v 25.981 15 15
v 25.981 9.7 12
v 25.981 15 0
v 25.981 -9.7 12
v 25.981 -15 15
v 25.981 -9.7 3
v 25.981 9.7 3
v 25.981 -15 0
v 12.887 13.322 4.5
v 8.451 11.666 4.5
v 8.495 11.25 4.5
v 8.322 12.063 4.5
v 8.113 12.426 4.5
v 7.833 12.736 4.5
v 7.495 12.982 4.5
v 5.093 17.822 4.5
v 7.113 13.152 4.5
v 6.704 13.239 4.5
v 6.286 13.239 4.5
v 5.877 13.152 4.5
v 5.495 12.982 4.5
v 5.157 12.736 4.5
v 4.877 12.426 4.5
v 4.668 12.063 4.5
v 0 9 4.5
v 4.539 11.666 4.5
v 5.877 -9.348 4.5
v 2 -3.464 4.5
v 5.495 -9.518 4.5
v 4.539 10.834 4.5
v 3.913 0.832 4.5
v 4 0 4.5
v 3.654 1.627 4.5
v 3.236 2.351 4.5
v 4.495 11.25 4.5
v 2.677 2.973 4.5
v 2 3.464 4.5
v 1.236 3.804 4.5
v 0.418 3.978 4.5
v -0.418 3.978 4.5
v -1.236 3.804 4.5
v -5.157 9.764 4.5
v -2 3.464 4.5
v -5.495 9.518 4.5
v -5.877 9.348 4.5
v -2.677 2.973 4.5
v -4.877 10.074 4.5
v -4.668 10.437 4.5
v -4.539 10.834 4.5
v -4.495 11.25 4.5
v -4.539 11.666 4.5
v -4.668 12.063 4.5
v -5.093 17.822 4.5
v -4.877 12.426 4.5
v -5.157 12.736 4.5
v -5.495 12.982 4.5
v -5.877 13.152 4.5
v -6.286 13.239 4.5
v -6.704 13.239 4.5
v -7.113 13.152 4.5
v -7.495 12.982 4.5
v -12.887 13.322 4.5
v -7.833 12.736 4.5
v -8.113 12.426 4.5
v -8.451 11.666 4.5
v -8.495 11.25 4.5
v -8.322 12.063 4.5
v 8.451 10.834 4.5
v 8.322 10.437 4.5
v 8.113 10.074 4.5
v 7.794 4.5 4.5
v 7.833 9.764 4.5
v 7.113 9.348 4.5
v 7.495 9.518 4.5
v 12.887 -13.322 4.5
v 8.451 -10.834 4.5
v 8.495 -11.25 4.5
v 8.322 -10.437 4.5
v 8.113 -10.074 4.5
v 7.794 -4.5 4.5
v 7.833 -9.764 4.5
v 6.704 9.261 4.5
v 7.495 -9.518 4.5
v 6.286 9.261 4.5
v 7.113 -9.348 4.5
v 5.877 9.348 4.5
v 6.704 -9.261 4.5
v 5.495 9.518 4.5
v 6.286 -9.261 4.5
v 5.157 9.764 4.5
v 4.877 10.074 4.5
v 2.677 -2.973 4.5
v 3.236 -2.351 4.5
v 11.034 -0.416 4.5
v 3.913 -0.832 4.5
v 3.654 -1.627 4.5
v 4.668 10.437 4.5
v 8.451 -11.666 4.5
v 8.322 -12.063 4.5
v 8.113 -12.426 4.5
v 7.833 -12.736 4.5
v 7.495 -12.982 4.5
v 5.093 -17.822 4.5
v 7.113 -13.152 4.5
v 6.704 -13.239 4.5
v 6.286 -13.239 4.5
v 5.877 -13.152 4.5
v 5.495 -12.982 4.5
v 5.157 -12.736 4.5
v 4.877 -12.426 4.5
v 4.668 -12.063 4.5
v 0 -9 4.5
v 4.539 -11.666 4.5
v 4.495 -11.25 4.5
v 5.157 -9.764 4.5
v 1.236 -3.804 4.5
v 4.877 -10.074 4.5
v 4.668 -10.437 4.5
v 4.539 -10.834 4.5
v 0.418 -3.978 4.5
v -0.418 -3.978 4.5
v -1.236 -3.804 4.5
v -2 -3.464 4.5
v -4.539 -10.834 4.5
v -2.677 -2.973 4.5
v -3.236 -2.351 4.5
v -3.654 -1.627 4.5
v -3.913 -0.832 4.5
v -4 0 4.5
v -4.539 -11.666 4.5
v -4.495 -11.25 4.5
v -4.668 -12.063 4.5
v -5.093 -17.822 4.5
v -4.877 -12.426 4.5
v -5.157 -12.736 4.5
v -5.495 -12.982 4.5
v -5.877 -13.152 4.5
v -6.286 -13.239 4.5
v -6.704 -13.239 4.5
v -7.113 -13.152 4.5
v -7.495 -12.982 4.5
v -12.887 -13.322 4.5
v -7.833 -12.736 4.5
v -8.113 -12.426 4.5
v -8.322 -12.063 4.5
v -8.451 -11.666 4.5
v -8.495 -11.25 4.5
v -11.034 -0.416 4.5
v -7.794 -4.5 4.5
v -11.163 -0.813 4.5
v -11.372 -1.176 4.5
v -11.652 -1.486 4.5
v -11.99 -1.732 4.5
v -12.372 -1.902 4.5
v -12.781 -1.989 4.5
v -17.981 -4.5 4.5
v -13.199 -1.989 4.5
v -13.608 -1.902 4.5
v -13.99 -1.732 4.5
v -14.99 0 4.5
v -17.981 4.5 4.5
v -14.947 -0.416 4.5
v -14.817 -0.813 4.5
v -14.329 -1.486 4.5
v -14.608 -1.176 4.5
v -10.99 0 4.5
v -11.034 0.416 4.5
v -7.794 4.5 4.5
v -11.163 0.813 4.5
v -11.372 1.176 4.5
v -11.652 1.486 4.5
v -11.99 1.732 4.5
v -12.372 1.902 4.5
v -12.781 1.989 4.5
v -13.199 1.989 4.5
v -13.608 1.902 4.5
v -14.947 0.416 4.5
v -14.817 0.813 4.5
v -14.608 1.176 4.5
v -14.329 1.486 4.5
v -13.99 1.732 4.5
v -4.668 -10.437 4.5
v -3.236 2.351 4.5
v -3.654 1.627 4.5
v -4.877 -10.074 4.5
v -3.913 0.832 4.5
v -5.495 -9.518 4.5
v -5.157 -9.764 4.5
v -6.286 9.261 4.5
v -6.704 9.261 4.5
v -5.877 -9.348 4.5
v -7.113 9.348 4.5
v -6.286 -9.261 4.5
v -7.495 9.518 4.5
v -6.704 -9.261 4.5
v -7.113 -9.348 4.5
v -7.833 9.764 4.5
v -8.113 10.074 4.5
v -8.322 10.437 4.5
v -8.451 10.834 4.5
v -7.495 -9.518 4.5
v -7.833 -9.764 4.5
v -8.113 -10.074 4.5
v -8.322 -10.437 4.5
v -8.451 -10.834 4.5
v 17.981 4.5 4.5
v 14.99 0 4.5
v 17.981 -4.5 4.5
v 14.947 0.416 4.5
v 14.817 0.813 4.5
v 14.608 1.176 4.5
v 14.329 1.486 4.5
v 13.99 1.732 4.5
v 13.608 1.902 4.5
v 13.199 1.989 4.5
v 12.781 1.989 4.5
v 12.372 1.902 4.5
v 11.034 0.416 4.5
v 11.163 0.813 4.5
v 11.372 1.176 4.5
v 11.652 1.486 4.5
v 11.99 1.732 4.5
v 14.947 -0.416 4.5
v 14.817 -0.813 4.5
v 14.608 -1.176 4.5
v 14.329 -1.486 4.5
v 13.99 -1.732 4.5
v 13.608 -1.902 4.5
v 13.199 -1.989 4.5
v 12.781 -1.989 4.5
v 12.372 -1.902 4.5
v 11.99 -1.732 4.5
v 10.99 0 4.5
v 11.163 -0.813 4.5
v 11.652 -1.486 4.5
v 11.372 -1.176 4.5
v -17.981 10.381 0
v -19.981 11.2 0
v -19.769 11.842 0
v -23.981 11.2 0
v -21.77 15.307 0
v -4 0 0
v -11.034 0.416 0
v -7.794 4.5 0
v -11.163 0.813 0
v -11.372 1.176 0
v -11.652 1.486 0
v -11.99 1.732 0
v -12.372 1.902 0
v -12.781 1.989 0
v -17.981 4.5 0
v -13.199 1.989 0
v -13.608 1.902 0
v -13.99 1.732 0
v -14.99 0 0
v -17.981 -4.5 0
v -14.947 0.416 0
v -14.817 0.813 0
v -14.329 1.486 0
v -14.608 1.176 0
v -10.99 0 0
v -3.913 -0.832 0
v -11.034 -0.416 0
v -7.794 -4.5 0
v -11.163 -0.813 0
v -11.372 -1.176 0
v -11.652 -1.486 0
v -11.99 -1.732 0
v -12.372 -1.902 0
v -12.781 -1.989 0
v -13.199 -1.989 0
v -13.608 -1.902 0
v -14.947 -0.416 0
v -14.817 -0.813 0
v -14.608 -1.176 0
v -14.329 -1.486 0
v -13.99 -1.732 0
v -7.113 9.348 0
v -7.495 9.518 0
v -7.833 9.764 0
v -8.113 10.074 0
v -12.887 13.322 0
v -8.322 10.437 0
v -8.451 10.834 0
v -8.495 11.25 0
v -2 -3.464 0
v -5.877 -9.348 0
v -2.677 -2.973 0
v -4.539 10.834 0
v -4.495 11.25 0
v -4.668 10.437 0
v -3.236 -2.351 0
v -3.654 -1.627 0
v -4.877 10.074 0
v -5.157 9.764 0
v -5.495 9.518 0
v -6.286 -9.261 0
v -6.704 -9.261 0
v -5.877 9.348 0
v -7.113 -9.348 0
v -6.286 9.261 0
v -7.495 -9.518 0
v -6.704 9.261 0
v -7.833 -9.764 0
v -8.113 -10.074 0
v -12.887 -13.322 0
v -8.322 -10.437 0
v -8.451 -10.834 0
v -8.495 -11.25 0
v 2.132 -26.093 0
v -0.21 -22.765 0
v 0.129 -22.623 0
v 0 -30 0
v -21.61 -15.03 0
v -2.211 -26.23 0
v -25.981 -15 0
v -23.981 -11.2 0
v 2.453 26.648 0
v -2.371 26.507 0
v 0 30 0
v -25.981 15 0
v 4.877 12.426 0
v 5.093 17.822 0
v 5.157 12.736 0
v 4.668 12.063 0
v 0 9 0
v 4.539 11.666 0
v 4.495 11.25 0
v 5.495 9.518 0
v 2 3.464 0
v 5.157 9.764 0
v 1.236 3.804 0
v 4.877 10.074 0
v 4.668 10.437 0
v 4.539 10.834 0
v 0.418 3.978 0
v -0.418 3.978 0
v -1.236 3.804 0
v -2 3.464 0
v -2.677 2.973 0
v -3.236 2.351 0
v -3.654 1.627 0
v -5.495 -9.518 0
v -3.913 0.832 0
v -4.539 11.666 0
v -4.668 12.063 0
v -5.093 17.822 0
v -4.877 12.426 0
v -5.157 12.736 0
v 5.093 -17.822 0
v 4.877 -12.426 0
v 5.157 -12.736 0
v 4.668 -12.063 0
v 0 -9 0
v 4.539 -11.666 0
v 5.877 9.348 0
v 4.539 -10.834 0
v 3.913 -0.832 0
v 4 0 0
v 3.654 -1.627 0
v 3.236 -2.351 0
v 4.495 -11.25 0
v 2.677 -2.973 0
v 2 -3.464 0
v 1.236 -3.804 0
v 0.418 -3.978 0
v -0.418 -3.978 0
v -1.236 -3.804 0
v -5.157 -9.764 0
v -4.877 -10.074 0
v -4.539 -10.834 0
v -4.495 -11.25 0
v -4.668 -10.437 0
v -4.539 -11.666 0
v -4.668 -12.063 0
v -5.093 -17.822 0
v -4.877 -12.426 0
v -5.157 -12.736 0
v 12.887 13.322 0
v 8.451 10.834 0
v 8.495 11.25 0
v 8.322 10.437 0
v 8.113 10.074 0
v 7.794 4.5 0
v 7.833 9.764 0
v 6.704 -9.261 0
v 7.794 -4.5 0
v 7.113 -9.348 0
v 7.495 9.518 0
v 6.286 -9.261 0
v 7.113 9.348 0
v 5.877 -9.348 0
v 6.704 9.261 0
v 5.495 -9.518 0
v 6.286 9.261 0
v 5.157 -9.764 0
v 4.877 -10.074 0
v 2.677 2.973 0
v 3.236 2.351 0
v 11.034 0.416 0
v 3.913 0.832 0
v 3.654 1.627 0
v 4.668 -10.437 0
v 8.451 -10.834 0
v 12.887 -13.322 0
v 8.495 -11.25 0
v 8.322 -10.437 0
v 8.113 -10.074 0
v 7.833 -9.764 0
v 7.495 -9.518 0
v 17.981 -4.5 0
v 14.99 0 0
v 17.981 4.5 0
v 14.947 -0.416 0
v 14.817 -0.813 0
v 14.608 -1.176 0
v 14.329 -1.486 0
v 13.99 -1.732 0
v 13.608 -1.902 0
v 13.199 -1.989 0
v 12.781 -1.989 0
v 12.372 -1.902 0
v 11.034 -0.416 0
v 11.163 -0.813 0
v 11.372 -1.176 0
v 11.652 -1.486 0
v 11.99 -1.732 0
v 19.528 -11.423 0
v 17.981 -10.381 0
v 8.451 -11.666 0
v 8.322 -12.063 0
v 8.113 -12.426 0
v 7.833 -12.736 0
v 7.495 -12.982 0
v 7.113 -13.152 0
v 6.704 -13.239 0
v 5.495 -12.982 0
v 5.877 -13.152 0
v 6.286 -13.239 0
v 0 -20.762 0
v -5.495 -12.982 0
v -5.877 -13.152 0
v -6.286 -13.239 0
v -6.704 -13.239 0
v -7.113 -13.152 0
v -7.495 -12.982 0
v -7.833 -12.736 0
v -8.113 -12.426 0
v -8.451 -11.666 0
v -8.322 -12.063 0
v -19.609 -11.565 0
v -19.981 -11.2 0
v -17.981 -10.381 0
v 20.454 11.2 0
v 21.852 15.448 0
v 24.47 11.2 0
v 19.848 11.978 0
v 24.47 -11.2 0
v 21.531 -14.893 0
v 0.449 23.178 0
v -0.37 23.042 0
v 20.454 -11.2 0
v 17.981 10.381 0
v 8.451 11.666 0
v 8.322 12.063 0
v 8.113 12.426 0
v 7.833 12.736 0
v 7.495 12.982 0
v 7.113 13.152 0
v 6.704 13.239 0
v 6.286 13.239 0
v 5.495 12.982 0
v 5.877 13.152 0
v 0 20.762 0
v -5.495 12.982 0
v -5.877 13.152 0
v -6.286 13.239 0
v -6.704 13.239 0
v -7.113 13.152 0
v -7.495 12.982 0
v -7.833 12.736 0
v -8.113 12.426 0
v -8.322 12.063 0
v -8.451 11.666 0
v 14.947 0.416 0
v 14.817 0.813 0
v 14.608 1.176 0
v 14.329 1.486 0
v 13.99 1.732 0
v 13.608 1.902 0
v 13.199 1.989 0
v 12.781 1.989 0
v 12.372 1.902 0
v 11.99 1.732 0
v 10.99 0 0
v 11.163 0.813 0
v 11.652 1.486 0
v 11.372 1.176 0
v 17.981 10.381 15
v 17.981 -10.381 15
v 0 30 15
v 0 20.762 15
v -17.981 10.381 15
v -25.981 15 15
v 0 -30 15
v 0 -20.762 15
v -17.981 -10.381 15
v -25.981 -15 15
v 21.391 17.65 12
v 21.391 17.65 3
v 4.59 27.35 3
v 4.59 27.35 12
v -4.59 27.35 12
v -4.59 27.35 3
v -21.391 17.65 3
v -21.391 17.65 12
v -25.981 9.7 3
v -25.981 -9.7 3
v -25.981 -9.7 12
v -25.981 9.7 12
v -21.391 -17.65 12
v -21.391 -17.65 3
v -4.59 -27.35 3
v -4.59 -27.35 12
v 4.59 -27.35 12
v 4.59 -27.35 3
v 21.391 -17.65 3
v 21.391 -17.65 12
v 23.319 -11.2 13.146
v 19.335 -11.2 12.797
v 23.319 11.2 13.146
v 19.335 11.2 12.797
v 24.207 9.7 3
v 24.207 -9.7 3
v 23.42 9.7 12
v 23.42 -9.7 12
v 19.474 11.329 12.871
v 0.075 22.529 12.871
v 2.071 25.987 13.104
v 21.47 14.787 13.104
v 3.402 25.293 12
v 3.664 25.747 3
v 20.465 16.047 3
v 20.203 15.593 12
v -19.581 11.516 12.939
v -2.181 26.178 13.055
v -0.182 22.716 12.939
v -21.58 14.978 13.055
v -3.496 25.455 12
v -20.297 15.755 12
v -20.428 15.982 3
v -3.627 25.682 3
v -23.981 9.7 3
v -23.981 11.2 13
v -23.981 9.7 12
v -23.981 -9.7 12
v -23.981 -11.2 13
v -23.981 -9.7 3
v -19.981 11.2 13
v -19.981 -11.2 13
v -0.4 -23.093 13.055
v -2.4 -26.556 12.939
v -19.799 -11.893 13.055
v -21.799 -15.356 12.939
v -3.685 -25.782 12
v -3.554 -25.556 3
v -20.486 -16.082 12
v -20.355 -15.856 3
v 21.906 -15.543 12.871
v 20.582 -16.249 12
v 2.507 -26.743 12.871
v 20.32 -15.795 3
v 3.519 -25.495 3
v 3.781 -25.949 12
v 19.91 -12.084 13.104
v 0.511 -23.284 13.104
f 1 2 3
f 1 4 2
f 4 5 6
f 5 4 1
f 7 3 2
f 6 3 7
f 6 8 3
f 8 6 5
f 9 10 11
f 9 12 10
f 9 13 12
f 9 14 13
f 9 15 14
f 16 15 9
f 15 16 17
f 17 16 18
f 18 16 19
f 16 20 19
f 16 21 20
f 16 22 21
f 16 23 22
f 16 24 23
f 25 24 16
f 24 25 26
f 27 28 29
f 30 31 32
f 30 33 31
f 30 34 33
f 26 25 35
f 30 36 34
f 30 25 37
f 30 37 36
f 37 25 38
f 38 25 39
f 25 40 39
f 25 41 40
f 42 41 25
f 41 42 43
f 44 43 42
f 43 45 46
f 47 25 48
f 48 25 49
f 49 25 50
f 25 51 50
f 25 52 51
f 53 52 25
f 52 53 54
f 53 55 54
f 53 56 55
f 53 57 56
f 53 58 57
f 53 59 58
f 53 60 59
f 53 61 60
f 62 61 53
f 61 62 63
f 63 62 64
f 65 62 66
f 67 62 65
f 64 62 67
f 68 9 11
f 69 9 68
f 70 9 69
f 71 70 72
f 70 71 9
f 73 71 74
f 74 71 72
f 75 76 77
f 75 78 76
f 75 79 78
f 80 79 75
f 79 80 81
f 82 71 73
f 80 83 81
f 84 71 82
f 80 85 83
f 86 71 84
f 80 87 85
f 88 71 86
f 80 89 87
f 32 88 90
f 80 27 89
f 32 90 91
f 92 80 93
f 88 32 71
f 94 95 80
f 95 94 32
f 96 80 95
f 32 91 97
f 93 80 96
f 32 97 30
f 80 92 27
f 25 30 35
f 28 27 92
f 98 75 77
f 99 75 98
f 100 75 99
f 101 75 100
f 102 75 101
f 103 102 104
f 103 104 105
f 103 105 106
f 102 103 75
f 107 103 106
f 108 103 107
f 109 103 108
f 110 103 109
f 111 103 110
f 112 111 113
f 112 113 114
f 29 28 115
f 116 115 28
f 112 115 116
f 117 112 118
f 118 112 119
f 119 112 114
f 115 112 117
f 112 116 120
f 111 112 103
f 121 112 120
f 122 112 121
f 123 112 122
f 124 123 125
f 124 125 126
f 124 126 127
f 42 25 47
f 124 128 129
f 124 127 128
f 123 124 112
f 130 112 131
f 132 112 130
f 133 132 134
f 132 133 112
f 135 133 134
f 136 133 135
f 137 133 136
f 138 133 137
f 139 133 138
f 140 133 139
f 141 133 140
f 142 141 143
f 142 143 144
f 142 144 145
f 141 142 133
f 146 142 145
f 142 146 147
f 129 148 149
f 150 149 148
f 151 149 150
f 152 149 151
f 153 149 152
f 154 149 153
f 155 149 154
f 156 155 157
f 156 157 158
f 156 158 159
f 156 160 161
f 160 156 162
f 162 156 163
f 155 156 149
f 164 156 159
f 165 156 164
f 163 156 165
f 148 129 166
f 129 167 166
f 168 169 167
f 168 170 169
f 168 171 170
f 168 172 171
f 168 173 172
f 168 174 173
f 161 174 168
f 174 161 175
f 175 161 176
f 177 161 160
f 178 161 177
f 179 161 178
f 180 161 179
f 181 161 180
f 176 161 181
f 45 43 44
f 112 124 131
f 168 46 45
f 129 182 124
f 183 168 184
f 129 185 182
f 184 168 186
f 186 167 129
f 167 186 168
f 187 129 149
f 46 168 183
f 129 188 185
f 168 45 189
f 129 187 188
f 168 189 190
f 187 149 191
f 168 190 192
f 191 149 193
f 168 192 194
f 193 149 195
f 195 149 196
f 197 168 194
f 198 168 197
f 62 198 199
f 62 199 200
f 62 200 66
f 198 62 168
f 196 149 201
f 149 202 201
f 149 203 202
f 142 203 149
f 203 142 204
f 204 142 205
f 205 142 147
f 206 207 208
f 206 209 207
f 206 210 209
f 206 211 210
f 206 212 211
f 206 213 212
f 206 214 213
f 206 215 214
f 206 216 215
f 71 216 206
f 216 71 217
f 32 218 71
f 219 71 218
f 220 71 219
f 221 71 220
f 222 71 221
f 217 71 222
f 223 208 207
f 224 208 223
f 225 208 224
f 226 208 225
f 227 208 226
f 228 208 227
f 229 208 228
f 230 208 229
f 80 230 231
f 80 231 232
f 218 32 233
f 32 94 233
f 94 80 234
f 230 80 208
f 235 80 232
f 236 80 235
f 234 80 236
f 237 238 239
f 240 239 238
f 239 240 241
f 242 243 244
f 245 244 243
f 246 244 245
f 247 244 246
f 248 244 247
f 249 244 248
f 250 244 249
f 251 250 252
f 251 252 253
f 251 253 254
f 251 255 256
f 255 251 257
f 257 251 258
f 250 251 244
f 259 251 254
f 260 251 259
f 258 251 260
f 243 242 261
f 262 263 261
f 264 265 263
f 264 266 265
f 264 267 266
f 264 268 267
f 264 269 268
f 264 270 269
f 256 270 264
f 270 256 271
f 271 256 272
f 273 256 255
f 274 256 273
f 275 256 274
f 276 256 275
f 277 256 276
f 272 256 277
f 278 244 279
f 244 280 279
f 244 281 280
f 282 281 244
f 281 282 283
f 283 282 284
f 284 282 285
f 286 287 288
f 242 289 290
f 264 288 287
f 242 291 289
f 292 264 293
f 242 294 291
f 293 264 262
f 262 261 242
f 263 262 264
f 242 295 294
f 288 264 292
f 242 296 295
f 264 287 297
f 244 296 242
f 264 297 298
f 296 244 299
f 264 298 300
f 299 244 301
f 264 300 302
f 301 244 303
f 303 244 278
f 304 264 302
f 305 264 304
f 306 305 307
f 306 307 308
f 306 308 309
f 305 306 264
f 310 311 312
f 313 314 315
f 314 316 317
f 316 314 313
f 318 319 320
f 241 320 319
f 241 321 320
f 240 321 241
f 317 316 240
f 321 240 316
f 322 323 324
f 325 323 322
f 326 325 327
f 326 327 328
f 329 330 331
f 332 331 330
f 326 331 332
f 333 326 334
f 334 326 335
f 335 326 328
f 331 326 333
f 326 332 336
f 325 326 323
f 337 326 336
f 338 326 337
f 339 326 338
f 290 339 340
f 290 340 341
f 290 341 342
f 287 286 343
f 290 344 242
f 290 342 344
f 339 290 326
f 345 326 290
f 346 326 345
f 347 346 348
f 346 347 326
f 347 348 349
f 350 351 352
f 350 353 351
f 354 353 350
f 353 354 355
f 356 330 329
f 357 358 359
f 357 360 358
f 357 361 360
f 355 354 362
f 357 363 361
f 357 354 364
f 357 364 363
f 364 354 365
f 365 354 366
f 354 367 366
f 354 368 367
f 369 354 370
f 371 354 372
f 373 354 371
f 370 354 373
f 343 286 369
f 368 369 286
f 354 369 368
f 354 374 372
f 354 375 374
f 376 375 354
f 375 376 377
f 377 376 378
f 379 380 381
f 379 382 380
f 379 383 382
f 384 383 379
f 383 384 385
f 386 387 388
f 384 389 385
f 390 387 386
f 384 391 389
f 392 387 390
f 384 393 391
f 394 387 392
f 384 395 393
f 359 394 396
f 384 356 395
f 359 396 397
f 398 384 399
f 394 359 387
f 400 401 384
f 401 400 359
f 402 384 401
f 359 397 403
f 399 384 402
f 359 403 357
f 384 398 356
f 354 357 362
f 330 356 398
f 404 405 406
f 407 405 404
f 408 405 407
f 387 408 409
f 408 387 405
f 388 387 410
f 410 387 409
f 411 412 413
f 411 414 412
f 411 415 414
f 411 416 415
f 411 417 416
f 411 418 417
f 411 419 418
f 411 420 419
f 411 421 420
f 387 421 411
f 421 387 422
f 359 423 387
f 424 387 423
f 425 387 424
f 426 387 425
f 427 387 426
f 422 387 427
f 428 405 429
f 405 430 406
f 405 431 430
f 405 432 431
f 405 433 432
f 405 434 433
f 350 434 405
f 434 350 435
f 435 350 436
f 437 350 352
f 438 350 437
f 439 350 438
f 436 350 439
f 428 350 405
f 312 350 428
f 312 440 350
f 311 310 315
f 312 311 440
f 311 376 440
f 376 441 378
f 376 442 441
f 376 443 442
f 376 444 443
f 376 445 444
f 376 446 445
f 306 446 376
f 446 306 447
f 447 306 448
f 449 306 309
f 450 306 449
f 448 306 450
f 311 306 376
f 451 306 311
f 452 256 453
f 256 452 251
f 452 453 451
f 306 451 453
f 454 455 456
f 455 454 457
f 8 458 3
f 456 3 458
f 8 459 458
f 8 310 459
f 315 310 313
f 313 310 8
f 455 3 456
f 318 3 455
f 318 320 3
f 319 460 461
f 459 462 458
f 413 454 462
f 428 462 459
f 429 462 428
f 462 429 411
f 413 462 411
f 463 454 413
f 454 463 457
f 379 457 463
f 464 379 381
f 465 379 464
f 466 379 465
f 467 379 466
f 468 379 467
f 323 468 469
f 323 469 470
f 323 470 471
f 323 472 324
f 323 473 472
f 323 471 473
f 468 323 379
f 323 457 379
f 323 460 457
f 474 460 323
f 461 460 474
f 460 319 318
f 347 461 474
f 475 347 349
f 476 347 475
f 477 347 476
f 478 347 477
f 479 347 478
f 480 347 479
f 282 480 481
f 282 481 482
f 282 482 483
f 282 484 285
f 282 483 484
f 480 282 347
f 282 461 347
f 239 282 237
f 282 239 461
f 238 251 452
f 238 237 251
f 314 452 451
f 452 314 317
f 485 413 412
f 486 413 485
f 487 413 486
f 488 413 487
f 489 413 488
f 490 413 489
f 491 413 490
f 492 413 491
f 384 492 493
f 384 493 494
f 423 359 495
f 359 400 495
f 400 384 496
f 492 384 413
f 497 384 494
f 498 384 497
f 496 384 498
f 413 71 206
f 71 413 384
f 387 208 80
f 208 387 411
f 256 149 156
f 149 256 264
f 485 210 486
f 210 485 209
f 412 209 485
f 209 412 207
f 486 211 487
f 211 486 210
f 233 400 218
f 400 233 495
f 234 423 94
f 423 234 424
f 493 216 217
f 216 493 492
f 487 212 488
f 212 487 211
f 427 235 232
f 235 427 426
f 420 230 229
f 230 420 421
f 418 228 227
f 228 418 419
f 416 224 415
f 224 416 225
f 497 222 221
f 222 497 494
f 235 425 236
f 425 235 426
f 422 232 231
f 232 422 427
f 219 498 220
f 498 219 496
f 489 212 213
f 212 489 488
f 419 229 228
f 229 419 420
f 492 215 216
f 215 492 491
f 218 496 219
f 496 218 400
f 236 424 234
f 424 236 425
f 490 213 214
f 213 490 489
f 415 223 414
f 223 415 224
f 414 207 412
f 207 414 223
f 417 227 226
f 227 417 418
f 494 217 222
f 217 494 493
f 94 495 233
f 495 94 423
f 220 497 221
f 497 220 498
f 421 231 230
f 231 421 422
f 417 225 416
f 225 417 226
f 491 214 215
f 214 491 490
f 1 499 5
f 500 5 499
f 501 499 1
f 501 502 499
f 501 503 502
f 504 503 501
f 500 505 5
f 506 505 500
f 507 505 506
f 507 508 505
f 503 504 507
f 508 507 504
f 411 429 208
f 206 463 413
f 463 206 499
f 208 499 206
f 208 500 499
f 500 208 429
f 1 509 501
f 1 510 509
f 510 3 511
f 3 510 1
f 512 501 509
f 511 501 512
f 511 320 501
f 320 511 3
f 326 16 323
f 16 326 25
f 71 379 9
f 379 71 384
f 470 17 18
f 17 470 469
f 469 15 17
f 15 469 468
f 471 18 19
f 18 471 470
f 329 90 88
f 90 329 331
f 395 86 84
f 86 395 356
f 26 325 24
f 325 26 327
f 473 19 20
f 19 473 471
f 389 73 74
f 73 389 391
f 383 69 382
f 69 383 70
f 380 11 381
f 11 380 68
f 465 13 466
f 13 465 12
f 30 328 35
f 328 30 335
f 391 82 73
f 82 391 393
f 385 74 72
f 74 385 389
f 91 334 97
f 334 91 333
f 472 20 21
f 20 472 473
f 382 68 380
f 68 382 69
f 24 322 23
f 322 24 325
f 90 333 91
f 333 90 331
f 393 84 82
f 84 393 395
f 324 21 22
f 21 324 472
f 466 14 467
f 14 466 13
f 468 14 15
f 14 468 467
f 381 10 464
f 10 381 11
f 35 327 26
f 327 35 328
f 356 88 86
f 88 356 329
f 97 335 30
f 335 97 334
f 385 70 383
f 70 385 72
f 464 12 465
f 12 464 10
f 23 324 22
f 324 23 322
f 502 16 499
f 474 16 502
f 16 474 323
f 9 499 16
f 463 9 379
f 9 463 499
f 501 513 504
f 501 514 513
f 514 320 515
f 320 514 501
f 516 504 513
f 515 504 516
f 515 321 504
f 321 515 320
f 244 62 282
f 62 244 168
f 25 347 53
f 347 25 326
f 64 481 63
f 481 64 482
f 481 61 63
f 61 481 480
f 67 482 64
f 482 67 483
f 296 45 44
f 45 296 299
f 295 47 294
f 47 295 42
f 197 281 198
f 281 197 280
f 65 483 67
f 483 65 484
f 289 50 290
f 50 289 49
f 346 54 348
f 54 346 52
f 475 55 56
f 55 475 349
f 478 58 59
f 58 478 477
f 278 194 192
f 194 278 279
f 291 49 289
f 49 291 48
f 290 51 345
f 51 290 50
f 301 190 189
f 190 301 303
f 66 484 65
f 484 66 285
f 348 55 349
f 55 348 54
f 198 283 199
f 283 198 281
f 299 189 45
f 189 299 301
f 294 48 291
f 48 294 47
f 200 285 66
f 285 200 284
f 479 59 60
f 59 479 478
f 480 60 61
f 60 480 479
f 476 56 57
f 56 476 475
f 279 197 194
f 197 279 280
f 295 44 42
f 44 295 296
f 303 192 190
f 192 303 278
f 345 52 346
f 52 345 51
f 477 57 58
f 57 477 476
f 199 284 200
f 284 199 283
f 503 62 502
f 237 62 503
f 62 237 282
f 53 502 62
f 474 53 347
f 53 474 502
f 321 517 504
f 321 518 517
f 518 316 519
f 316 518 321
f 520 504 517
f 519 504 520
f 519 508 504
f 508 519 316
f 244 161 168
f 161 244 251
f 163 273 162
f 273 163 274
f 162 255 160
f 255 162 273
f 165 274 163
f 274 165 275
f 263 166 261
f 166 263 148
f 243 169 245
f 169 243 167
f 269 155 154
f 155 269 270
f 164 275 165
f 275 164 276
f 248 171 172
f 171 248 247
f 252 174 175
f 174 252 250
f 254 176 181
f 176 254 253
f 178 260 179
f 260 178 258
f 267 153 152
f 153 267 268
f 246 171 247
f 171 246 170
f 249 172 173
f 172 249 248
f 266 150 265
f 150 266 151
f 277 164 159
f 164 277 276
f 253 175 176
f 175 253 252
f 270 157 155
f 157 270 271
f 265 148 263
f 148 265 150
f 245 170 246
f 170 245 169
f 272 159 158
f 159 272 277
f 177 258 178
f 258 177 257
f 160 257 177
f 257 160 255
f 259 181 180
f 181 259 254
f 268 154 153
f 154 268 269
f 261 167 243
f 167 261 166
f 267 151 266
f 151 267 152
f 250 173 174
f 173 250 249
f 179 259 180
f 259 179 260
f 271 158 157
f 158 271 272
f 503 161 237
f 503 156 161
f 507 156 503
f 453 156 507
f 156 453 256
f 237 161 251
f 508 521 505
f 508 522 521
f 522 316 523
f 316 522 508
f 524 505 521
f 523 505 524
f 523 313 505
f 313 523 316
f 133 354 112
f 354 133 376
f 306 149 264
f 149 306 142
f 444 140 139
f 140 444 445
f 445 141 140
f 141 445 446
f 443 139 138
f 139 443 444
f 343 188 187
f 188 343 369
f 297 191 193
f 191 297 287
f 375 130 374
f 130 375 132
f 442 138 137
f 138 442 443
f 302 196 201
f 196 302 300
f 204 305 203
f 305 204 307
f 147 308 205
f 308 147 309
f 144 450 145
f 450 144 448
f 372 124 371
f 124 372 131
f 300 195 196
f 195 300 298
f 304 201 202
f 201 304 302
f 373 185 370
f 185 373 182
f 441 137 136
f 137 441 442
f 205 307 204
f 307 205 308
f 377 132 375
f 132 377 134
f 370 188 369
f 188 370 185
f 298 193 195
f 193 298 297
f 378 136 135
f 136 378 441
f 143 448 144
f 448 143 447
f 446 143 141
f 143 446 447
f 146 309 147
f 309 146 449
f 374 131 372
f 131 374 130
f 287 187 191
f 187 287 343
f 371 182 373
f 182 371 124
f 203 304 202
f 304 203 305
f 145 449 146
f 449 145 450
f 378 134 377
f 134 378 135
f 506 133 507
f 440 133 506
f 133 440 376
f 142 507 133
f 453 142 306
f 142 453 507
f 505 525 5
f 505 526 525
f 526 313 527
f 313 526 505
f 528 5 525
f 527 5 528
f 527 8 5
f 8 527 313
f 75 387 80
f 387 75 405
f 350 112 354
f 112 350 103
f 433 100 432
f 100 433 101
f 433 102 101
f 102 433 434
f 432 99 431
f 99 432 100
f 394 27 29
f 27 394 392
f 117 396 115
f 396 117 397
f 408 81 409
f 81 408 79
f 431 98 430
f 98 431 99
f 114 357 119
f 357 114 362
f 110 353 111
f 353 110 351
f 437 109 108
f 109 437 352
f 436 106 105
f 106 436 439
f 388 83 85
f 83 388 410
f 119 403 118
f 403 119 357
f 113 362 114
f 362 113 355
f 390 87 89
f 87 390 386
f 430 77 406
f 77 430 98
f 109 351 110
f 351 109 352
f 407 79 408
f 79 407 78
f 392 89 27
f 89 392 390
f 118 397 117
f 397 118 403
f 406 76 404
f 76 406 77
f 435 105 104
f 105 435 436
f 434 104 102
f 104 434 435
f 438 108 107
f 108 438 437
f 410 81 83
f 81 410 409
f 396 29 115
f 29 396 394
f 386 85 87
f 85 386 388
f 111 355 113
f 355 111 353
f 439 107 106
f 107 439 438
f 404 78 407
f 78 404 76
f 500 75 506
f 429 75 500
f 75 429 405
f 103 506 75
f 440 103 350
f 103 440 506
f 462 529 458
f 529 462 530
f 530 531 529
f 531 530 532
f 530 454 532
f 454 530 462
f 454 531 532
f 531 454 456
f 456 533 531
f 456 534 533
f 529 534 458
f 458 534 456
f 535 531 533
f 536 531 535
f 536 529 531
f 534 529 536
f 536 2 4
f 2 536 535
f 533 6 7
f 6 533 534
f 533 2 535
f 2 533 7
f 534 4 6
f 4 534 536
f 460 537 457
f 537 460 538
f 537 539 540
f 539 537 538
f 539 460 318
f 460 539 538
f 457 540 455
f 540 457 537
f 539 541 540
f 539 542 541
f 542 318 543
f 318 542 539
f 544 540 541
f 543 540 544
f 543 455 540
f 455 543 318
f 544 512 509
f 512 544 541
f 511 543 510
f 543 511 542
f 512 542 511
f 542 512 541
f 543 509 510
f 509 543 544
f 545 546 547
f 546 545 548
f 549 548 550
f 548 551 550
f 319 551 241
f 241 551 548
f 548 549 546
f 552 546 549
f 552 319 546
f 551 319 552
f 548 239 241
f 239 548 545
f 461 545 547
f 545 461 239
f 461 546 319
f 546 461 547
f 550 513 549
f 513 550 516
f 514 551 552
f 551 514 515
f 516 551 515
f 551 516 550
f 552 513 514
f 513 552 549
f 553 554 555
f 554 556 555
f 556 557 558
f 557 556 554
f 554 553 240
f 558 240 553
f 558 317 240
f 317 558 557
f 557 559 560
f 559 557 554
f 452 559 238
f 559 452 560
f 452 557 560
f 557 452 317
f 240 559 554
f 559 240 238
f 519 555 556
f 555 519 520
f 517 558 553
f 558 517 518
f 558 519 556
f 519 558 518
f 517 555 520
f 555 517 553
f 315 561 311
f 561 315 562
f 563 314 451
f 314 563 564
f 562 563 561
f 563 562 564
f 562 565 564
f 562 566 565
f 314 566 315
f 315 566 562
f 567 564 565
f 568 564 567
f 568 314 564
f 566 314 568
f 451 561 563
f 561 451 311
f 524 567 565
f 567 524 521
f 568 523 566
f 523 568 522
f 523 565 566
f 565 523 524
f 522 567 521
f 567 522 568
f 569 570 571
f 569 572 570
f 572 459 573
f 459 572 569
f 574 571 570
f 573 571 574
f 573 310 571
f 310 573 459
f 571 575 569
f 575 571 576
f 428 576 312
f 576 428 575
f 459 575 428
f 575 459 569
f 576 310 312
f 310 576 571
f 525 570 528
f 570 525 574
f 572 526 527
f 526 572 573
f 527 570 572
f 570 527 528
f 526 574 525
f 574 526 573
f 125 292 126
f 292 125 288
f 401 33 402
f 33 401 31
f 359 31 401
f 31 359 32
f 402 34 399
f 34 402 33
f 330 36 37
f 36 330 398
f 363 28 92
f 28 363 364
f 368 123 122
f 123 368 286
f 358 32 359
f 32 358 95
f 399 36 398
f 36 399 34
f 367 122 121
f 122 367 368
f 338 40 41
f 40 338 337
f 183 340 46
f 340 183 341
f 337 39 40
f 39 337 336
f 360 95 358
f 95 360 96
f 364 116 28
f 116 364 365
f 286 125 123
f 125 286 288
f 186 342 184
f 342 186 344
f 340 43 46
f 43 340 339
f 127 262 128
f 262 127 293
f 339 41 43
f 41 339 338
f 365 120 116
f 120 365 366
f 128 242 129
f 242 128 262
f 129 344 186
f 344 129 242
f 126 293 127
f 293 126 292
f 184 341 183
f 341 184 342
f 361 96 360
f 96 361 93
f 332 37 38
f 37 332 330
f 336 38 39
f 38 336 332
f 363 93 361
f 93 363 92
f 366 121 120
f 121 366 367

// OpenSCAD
multiHolder(sides = 6, diameter = 60, height =15, mirrorThickness = 4, mirrorAngleSpreadDeg = 10, mirrorMarginFactor=0.3, wallThickness=2);


module multiHolder(sides = 5, diameter = 80, height = 20, mirrorAngleSpreadDeg = 15, mirrorThickness = 3, centerHoleDiam = 8, defaultSpokeHoleDiam = 4, mirrorOpeningsUp = false, mirrorMarginFactor=1, wallThickness = 3) {

    radius = diameter/2;

    sideLen = 2 * radius * sin ( 180 / sides );

    angleStep = 360 / sides;

    // The apothem, or distance from center to middle of a side
    inradius = radius * cos(180 / sides);

    spokeW = sideLen * 0.3;
    spokeH = height * 0.3;
    spokeHoleDiam = min(defaultSpokeHoleDiam, spokeW - wallThickness*2);
    spokeHoleDist = inradius * 0.5;

    mirrorSideMargin = mirrorMarginFactor * mirrorThickness * 1.5 + wallThickness;
    mirrorW = sideLen - mirrorSideMargin*2;
    mirrorH = height + wallThickness*2;
    mirrorAngleStep = mirrorAngleSpreadDeg / sides;
    mirrorZOffset = wallThickness*2 * (mirrorOpeningsUp ? 1 : -1); 
    
    echo("Mirror width: ", mirrorW-wallThickness/2, "mm");
    echo("Mirror height: ", mirrorH-wallThickness, "mm");
    
    windowW = mirrorW - wallThickness * 1.5;
    windowH = height - wallThickness*3;
    
    difference() {    
        // Add sides
        for (i = [0 : sides-1]) {
            rotate([0, 0, i * angleStep]) {
                // Holder
                box(mirrorThickness + wallThickness*2, sideLen, height,
                    inradius-wallThickness*2-mirrorThickness, 0, 0,
                    yCenter=true);

                // Spoke
                difference() {
                    box(inradius, spokeW, spokeH, yCenter=true);

                    translate([spokeHoleDist, 0, -1])
                        cylinder(r=spokeHoleDiam/2, h = spokeH+2, $fn=30);
                }            
            }
        }
        
        // Cut out mirrors
        for (i = [0 : sides-1]) {
            rotate([0, 0, i * angleStep]) {
                translate([inradius-wallThickness-mirrorThickness/2, 0, height/2-wallThickness]) {
                    rotate([0, i * mirrorAngleStep - mirrorAngleSpreadDeg/2, 0]) {
                        // Cutout for mirror
                        box(mirrorThickness, mirrorW, mirrorH, 
                            -mirrorThickness/2, 0, mirrorZOffset-height/2,
                            yCenter = true, zCenter=false);
                        
                    }
                    // Cutout for window
                    box(mirrorThickness+wallThickness*2, windowW, windowH, 
                        0, 0, wallThickness,
                        yCenter = true, zCenter=true);
                }
            }
        }

        // Cutout center hole
        if (centerHoleDiam > 0) {
            cylinder(r=centerHoleDiam/2, h = height*2, center=true, $fn=30);
        }        
    }

}


module box(xSize, ySize, zSize, x=0, y=0, z=0, xCenter=false, yCenter=false, zCenter= false) {
    translate([x - (xCenter ? xSize/2 : 0), 
               y - (yCenter ? ySize/2 : 0), 
               z - (zCenter ? zSize/2 : 0)]) {
        cube([xSize, ySize, zSize]);
    }

}
